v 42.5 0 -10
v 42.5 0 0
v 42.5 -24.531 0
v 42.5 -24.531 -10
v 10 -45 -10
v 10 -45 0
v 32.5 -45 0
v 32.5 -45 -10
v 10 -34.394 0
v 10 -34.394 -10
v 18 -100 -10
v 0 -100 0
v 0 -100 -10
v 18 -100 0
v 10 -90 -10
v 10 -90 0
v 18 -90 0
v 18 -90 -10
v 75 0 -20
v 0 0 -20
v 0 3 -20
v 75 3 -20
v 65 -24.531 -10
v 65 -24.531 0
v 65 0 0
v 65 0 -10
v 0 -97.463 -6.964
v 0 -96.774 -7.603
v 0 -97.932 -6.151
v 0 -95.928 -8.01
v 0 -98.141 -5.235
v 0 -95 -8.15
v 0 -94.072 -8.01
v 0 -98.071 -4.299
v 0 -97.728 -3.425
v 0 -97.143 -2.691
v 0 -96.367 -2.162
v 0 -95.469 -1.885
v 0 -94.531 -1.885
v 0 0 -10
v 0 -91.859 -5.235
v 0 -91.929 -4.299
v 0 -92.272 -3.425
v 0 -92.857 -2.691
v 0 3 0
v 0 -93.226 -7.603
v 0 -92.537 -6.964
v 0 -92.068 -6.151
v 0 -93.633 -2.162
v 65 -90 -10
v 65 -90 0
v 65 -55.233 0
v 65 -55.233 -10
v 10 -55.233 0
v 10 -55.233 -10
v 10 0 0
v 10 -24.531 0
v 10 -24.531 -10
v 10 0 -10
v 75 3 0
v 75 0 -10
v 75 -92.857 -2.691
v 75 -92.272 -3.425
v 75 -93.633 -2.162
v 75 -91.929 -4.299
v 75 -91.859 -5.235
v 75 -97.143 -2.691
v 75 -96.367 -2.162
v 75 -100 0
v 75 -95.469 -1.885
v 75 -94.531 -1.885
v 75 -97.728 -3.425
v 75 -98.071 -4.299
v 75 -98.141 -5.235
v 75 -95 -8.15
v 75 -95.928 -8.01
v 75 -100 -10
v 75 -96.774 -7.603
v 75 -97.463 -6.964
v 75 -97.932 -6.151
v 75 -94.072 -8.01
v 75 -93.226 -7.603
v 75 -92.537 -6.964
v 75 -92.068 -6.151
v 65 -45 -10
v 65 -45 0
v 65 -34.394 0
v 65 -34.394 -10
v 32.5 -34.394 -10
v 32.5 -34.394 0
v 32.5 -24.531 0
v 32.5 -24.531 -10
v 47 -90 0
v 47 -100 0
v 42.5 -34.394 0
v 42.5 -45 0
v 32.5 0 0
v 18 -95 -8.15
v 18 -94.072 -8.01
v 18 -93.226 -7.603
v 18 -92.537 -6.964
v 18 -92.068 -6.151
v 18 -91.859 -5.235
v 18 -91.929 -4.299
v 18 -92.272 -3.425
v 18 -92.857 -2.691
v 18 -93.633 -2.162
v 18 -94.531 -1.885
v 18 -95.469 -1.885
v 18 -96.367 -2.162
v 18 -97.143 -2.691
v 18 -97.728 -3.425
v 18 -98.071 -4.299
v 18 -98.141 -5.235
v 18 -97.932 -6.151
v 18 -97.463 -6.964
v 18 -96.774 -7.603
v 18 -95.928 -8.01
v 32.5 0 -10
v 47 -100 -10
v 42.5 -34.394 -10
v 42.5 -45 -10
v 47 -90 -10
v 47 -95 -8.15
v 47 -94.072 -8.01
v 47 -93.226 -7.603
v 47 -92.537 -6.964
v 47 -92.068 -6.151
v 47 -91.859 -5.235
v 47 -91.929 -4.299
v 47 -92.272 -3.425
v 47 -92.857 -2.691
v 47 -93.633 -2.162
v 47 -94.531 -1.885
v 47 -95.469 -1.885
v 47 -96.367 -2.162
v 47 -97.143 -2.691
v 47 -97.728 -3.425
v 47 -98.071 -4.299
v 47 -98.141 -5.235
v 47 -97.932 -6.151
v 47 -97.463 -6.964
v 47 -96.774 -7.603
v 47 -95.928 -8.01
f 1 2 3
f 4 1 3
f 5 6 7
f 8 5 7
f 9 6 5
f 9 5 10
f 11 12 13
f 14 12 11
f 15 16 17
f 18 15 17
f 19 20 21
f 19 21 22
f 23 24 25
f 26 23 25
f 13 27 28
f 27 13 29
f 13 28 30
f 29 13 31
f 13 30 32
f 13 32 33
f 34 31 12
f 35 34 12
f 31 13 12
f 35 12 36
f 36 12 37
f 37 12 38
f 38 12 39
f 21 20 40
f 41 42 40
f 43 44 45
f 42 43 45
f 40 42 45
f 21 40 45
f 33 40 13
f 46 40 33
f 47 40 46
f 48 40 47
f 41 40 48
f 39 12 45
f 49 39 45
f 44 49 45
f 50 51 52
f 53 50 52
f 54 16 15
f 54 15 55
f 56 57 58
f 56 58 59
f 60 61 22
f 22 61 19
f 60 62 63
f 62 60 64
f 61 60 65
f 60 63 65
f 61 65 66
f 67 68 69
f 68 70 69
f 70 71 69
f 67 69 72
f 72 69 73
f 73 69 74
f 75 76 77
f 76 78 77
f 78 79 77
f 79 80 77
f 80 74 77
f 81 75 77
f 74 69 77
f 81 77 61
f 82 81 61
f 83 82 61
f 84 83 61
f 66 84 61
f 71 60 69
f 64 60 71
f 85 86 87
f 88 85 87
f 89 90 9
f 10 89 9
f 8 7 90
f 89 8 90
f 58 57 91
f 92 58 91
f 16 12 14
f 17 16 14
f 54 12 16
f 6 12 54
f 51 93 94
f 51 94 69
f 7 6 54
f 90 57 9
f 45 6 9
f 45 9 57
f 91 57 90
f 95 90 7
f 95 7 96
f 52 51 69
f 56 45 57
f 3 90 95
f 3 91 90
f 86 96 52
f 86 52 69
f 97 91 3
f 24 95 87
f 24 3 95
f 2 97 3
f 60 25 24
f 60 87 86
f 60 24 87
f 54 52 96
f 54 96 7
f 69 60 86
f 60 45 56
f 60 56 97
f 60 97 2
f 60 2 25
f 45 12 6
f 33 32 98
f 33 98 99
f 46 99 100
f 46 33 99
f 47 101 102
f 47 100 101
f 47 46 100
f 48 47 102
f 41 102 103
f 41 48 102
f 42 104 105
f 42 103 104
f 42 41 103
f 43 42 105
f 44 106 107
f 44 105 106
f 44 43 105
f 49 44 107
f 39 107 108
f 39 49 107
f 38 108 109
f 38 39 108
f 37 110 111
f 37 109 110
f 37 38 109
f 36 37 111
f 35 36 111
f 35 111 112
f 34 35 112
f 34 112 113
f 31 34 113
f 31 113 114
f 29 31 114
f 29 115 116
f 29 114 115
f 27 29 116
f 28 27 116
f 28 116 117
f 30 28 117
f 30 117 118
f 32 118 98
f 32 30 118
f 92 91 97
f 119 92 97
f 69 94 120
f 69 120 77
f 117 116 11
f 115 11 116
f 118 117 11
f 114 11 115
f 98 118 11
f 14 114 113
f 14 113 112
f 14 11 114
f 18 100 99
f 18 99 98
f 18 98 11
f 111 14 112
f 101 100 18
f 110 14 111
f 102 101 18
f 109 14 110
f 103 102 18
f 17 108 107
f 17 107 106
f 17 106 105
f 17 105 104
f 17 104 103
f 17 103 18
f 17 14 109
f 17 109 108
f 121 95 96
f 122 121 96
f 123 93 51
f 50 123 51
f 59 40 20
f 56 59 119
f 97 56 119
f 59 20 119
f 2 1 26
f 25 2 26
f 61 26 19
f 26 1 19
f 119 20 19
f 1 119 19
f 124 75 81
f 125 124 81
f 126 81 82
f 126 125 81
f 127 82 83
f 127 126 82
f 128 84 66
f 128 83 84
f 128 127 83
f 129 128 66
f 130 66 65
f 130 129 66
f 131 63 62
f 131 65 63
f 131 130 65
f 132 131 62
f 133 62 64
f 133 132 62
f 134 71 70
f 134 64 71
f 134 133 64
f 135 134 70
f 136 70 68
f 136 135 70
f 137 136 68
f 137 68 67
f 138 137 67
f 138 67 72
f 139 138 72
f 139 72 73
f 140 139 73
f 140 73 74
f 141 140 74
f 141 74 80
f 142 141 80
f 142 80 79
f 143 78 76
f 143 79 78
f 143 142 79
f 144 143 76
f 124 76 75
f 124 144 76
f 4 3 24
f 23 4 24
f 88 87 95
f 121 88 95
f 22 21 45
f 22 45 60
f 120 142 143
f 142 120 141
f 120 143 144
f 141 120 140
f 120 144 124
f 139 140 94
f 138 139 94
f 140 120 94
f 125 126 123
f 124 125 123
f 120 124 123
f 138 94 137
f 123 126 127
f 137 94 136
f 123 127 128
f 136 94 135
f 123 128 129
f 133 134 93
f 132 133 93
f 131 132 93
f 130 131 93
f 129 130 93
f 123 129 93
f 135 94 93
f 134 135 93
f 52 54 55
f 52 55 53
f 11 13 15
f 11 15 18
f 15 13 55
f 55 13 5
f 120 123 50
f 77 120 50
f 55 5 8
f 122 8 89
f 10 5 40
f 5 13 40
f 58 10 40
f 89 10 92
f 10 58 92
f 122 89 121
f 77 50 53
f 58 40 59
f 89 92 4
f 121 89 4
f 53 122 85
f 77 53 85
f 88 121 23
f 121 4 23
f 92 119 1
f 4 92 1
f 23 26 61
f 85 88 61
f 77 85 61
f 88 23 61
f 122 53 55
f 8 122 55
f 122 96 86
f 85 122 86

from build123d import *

# Parameters (mm, degrees)
SKETCH1_W               = 75
SKETCH1_H               = 20
BOSS_EXTRUDE1_DEPTH     = 3
SKETCH2_W               = 10
SKETCH2_H               = 100
BOSS_EXTRUDE2_DEPTH     = 10
SKETCH5_W               = 8
SKETCH5_H               = 10
SKETCH5_W_2             = 18
BOSS_EXTRUDE3_DEPTH     = 10
CUT_EXTRUDE1_DEPTH      = 117.828934772
CUT_EXTRUDE1_DEPTH_BACK = 117.828934772
SKETCH7_R               = 3.15
BOSS_EXTRUDE5_DEPTH     = 10


with BuildPart() as part:
    # Sketch1 → Boss-Extrude1 (new body)
    with BuildSketch(Plane(origin=(0, 0, 0), x_dir=(1, 0, 0), z_dir=(0, 1, 0))):
        with Locations((37.5, 10)):
            Rectangle(SKETCH1_W, SKETCH1_H)
    extrude(amount=BOSS_EXTRUDE1_DEPTH)

    # Sketch2 → Boss-Extrude2 (add)
    with BuildSketch(Plane.XY):
        with Locations((5, -50)):
            Rectangle(SKETCH2_W, SKETCH2_H)
        with Locations((70, -50)):
            Rectangle(SKETCH2_W, SKETCH2_H)
    extrude(amount=-BOSS_EXTRUDE2_DEPTH)

    # Sketch5 → Boss-Extrude3 (add)
    with BuildSketch(Plane.XY):
        with Locations((14, -95)):
            Rectangle(SKETCH5_W, SKETCH5_H)
        with Locations((56, -95)):
            Rectangle(SKETCH5_W_2, SKETCH5_H)
    extrude(amount=-BOSS_EXTRUDE3_DEPTH)

    # Sketch7 → Cut-Extrude1 (cut, two sides: drawn at the far end of the back side and taken through both)
    with BuildSketch(Plane(origin=(18, 0, 0), x_dir=(0, 0, -1), z_dir=(1, 0, 0)).offset(-CUT_EXTRUDE1_DEPTH_BACK)):
        with Locations((5, -95)):
            Circle(SKETCH7_R)
    extrude(amount=CUT_EXTRUDE1_DEPTH + CUT_EXTRUDE1_DEPTH_BACK, mode=Mode.SUBTRACT)

    # Sketch13 → Boss-Extrude5 (add)
    with BuildSketch(Plane.XY):
        Polygon((10, -24.530919021), (32.5, -24.530919021), (32.5, 0), (42.5, 0), (42.5, -24.530919021), (65, -24.530919021), (65, -34.394439552), (42.5, -34.394439552), (42.5, -45), (65, -45), (65, -55.233083722), (42.5, -55.233083722), (32.5, -55.233083722), (10, -55.233083722), (10, -45), (32.5, -45), (32.5, -34.394439552), (10, -34.394439552), align=None)
    extrude(amount=-BOSS_EXTRUDE5_DEPTH)


solid = part.part
